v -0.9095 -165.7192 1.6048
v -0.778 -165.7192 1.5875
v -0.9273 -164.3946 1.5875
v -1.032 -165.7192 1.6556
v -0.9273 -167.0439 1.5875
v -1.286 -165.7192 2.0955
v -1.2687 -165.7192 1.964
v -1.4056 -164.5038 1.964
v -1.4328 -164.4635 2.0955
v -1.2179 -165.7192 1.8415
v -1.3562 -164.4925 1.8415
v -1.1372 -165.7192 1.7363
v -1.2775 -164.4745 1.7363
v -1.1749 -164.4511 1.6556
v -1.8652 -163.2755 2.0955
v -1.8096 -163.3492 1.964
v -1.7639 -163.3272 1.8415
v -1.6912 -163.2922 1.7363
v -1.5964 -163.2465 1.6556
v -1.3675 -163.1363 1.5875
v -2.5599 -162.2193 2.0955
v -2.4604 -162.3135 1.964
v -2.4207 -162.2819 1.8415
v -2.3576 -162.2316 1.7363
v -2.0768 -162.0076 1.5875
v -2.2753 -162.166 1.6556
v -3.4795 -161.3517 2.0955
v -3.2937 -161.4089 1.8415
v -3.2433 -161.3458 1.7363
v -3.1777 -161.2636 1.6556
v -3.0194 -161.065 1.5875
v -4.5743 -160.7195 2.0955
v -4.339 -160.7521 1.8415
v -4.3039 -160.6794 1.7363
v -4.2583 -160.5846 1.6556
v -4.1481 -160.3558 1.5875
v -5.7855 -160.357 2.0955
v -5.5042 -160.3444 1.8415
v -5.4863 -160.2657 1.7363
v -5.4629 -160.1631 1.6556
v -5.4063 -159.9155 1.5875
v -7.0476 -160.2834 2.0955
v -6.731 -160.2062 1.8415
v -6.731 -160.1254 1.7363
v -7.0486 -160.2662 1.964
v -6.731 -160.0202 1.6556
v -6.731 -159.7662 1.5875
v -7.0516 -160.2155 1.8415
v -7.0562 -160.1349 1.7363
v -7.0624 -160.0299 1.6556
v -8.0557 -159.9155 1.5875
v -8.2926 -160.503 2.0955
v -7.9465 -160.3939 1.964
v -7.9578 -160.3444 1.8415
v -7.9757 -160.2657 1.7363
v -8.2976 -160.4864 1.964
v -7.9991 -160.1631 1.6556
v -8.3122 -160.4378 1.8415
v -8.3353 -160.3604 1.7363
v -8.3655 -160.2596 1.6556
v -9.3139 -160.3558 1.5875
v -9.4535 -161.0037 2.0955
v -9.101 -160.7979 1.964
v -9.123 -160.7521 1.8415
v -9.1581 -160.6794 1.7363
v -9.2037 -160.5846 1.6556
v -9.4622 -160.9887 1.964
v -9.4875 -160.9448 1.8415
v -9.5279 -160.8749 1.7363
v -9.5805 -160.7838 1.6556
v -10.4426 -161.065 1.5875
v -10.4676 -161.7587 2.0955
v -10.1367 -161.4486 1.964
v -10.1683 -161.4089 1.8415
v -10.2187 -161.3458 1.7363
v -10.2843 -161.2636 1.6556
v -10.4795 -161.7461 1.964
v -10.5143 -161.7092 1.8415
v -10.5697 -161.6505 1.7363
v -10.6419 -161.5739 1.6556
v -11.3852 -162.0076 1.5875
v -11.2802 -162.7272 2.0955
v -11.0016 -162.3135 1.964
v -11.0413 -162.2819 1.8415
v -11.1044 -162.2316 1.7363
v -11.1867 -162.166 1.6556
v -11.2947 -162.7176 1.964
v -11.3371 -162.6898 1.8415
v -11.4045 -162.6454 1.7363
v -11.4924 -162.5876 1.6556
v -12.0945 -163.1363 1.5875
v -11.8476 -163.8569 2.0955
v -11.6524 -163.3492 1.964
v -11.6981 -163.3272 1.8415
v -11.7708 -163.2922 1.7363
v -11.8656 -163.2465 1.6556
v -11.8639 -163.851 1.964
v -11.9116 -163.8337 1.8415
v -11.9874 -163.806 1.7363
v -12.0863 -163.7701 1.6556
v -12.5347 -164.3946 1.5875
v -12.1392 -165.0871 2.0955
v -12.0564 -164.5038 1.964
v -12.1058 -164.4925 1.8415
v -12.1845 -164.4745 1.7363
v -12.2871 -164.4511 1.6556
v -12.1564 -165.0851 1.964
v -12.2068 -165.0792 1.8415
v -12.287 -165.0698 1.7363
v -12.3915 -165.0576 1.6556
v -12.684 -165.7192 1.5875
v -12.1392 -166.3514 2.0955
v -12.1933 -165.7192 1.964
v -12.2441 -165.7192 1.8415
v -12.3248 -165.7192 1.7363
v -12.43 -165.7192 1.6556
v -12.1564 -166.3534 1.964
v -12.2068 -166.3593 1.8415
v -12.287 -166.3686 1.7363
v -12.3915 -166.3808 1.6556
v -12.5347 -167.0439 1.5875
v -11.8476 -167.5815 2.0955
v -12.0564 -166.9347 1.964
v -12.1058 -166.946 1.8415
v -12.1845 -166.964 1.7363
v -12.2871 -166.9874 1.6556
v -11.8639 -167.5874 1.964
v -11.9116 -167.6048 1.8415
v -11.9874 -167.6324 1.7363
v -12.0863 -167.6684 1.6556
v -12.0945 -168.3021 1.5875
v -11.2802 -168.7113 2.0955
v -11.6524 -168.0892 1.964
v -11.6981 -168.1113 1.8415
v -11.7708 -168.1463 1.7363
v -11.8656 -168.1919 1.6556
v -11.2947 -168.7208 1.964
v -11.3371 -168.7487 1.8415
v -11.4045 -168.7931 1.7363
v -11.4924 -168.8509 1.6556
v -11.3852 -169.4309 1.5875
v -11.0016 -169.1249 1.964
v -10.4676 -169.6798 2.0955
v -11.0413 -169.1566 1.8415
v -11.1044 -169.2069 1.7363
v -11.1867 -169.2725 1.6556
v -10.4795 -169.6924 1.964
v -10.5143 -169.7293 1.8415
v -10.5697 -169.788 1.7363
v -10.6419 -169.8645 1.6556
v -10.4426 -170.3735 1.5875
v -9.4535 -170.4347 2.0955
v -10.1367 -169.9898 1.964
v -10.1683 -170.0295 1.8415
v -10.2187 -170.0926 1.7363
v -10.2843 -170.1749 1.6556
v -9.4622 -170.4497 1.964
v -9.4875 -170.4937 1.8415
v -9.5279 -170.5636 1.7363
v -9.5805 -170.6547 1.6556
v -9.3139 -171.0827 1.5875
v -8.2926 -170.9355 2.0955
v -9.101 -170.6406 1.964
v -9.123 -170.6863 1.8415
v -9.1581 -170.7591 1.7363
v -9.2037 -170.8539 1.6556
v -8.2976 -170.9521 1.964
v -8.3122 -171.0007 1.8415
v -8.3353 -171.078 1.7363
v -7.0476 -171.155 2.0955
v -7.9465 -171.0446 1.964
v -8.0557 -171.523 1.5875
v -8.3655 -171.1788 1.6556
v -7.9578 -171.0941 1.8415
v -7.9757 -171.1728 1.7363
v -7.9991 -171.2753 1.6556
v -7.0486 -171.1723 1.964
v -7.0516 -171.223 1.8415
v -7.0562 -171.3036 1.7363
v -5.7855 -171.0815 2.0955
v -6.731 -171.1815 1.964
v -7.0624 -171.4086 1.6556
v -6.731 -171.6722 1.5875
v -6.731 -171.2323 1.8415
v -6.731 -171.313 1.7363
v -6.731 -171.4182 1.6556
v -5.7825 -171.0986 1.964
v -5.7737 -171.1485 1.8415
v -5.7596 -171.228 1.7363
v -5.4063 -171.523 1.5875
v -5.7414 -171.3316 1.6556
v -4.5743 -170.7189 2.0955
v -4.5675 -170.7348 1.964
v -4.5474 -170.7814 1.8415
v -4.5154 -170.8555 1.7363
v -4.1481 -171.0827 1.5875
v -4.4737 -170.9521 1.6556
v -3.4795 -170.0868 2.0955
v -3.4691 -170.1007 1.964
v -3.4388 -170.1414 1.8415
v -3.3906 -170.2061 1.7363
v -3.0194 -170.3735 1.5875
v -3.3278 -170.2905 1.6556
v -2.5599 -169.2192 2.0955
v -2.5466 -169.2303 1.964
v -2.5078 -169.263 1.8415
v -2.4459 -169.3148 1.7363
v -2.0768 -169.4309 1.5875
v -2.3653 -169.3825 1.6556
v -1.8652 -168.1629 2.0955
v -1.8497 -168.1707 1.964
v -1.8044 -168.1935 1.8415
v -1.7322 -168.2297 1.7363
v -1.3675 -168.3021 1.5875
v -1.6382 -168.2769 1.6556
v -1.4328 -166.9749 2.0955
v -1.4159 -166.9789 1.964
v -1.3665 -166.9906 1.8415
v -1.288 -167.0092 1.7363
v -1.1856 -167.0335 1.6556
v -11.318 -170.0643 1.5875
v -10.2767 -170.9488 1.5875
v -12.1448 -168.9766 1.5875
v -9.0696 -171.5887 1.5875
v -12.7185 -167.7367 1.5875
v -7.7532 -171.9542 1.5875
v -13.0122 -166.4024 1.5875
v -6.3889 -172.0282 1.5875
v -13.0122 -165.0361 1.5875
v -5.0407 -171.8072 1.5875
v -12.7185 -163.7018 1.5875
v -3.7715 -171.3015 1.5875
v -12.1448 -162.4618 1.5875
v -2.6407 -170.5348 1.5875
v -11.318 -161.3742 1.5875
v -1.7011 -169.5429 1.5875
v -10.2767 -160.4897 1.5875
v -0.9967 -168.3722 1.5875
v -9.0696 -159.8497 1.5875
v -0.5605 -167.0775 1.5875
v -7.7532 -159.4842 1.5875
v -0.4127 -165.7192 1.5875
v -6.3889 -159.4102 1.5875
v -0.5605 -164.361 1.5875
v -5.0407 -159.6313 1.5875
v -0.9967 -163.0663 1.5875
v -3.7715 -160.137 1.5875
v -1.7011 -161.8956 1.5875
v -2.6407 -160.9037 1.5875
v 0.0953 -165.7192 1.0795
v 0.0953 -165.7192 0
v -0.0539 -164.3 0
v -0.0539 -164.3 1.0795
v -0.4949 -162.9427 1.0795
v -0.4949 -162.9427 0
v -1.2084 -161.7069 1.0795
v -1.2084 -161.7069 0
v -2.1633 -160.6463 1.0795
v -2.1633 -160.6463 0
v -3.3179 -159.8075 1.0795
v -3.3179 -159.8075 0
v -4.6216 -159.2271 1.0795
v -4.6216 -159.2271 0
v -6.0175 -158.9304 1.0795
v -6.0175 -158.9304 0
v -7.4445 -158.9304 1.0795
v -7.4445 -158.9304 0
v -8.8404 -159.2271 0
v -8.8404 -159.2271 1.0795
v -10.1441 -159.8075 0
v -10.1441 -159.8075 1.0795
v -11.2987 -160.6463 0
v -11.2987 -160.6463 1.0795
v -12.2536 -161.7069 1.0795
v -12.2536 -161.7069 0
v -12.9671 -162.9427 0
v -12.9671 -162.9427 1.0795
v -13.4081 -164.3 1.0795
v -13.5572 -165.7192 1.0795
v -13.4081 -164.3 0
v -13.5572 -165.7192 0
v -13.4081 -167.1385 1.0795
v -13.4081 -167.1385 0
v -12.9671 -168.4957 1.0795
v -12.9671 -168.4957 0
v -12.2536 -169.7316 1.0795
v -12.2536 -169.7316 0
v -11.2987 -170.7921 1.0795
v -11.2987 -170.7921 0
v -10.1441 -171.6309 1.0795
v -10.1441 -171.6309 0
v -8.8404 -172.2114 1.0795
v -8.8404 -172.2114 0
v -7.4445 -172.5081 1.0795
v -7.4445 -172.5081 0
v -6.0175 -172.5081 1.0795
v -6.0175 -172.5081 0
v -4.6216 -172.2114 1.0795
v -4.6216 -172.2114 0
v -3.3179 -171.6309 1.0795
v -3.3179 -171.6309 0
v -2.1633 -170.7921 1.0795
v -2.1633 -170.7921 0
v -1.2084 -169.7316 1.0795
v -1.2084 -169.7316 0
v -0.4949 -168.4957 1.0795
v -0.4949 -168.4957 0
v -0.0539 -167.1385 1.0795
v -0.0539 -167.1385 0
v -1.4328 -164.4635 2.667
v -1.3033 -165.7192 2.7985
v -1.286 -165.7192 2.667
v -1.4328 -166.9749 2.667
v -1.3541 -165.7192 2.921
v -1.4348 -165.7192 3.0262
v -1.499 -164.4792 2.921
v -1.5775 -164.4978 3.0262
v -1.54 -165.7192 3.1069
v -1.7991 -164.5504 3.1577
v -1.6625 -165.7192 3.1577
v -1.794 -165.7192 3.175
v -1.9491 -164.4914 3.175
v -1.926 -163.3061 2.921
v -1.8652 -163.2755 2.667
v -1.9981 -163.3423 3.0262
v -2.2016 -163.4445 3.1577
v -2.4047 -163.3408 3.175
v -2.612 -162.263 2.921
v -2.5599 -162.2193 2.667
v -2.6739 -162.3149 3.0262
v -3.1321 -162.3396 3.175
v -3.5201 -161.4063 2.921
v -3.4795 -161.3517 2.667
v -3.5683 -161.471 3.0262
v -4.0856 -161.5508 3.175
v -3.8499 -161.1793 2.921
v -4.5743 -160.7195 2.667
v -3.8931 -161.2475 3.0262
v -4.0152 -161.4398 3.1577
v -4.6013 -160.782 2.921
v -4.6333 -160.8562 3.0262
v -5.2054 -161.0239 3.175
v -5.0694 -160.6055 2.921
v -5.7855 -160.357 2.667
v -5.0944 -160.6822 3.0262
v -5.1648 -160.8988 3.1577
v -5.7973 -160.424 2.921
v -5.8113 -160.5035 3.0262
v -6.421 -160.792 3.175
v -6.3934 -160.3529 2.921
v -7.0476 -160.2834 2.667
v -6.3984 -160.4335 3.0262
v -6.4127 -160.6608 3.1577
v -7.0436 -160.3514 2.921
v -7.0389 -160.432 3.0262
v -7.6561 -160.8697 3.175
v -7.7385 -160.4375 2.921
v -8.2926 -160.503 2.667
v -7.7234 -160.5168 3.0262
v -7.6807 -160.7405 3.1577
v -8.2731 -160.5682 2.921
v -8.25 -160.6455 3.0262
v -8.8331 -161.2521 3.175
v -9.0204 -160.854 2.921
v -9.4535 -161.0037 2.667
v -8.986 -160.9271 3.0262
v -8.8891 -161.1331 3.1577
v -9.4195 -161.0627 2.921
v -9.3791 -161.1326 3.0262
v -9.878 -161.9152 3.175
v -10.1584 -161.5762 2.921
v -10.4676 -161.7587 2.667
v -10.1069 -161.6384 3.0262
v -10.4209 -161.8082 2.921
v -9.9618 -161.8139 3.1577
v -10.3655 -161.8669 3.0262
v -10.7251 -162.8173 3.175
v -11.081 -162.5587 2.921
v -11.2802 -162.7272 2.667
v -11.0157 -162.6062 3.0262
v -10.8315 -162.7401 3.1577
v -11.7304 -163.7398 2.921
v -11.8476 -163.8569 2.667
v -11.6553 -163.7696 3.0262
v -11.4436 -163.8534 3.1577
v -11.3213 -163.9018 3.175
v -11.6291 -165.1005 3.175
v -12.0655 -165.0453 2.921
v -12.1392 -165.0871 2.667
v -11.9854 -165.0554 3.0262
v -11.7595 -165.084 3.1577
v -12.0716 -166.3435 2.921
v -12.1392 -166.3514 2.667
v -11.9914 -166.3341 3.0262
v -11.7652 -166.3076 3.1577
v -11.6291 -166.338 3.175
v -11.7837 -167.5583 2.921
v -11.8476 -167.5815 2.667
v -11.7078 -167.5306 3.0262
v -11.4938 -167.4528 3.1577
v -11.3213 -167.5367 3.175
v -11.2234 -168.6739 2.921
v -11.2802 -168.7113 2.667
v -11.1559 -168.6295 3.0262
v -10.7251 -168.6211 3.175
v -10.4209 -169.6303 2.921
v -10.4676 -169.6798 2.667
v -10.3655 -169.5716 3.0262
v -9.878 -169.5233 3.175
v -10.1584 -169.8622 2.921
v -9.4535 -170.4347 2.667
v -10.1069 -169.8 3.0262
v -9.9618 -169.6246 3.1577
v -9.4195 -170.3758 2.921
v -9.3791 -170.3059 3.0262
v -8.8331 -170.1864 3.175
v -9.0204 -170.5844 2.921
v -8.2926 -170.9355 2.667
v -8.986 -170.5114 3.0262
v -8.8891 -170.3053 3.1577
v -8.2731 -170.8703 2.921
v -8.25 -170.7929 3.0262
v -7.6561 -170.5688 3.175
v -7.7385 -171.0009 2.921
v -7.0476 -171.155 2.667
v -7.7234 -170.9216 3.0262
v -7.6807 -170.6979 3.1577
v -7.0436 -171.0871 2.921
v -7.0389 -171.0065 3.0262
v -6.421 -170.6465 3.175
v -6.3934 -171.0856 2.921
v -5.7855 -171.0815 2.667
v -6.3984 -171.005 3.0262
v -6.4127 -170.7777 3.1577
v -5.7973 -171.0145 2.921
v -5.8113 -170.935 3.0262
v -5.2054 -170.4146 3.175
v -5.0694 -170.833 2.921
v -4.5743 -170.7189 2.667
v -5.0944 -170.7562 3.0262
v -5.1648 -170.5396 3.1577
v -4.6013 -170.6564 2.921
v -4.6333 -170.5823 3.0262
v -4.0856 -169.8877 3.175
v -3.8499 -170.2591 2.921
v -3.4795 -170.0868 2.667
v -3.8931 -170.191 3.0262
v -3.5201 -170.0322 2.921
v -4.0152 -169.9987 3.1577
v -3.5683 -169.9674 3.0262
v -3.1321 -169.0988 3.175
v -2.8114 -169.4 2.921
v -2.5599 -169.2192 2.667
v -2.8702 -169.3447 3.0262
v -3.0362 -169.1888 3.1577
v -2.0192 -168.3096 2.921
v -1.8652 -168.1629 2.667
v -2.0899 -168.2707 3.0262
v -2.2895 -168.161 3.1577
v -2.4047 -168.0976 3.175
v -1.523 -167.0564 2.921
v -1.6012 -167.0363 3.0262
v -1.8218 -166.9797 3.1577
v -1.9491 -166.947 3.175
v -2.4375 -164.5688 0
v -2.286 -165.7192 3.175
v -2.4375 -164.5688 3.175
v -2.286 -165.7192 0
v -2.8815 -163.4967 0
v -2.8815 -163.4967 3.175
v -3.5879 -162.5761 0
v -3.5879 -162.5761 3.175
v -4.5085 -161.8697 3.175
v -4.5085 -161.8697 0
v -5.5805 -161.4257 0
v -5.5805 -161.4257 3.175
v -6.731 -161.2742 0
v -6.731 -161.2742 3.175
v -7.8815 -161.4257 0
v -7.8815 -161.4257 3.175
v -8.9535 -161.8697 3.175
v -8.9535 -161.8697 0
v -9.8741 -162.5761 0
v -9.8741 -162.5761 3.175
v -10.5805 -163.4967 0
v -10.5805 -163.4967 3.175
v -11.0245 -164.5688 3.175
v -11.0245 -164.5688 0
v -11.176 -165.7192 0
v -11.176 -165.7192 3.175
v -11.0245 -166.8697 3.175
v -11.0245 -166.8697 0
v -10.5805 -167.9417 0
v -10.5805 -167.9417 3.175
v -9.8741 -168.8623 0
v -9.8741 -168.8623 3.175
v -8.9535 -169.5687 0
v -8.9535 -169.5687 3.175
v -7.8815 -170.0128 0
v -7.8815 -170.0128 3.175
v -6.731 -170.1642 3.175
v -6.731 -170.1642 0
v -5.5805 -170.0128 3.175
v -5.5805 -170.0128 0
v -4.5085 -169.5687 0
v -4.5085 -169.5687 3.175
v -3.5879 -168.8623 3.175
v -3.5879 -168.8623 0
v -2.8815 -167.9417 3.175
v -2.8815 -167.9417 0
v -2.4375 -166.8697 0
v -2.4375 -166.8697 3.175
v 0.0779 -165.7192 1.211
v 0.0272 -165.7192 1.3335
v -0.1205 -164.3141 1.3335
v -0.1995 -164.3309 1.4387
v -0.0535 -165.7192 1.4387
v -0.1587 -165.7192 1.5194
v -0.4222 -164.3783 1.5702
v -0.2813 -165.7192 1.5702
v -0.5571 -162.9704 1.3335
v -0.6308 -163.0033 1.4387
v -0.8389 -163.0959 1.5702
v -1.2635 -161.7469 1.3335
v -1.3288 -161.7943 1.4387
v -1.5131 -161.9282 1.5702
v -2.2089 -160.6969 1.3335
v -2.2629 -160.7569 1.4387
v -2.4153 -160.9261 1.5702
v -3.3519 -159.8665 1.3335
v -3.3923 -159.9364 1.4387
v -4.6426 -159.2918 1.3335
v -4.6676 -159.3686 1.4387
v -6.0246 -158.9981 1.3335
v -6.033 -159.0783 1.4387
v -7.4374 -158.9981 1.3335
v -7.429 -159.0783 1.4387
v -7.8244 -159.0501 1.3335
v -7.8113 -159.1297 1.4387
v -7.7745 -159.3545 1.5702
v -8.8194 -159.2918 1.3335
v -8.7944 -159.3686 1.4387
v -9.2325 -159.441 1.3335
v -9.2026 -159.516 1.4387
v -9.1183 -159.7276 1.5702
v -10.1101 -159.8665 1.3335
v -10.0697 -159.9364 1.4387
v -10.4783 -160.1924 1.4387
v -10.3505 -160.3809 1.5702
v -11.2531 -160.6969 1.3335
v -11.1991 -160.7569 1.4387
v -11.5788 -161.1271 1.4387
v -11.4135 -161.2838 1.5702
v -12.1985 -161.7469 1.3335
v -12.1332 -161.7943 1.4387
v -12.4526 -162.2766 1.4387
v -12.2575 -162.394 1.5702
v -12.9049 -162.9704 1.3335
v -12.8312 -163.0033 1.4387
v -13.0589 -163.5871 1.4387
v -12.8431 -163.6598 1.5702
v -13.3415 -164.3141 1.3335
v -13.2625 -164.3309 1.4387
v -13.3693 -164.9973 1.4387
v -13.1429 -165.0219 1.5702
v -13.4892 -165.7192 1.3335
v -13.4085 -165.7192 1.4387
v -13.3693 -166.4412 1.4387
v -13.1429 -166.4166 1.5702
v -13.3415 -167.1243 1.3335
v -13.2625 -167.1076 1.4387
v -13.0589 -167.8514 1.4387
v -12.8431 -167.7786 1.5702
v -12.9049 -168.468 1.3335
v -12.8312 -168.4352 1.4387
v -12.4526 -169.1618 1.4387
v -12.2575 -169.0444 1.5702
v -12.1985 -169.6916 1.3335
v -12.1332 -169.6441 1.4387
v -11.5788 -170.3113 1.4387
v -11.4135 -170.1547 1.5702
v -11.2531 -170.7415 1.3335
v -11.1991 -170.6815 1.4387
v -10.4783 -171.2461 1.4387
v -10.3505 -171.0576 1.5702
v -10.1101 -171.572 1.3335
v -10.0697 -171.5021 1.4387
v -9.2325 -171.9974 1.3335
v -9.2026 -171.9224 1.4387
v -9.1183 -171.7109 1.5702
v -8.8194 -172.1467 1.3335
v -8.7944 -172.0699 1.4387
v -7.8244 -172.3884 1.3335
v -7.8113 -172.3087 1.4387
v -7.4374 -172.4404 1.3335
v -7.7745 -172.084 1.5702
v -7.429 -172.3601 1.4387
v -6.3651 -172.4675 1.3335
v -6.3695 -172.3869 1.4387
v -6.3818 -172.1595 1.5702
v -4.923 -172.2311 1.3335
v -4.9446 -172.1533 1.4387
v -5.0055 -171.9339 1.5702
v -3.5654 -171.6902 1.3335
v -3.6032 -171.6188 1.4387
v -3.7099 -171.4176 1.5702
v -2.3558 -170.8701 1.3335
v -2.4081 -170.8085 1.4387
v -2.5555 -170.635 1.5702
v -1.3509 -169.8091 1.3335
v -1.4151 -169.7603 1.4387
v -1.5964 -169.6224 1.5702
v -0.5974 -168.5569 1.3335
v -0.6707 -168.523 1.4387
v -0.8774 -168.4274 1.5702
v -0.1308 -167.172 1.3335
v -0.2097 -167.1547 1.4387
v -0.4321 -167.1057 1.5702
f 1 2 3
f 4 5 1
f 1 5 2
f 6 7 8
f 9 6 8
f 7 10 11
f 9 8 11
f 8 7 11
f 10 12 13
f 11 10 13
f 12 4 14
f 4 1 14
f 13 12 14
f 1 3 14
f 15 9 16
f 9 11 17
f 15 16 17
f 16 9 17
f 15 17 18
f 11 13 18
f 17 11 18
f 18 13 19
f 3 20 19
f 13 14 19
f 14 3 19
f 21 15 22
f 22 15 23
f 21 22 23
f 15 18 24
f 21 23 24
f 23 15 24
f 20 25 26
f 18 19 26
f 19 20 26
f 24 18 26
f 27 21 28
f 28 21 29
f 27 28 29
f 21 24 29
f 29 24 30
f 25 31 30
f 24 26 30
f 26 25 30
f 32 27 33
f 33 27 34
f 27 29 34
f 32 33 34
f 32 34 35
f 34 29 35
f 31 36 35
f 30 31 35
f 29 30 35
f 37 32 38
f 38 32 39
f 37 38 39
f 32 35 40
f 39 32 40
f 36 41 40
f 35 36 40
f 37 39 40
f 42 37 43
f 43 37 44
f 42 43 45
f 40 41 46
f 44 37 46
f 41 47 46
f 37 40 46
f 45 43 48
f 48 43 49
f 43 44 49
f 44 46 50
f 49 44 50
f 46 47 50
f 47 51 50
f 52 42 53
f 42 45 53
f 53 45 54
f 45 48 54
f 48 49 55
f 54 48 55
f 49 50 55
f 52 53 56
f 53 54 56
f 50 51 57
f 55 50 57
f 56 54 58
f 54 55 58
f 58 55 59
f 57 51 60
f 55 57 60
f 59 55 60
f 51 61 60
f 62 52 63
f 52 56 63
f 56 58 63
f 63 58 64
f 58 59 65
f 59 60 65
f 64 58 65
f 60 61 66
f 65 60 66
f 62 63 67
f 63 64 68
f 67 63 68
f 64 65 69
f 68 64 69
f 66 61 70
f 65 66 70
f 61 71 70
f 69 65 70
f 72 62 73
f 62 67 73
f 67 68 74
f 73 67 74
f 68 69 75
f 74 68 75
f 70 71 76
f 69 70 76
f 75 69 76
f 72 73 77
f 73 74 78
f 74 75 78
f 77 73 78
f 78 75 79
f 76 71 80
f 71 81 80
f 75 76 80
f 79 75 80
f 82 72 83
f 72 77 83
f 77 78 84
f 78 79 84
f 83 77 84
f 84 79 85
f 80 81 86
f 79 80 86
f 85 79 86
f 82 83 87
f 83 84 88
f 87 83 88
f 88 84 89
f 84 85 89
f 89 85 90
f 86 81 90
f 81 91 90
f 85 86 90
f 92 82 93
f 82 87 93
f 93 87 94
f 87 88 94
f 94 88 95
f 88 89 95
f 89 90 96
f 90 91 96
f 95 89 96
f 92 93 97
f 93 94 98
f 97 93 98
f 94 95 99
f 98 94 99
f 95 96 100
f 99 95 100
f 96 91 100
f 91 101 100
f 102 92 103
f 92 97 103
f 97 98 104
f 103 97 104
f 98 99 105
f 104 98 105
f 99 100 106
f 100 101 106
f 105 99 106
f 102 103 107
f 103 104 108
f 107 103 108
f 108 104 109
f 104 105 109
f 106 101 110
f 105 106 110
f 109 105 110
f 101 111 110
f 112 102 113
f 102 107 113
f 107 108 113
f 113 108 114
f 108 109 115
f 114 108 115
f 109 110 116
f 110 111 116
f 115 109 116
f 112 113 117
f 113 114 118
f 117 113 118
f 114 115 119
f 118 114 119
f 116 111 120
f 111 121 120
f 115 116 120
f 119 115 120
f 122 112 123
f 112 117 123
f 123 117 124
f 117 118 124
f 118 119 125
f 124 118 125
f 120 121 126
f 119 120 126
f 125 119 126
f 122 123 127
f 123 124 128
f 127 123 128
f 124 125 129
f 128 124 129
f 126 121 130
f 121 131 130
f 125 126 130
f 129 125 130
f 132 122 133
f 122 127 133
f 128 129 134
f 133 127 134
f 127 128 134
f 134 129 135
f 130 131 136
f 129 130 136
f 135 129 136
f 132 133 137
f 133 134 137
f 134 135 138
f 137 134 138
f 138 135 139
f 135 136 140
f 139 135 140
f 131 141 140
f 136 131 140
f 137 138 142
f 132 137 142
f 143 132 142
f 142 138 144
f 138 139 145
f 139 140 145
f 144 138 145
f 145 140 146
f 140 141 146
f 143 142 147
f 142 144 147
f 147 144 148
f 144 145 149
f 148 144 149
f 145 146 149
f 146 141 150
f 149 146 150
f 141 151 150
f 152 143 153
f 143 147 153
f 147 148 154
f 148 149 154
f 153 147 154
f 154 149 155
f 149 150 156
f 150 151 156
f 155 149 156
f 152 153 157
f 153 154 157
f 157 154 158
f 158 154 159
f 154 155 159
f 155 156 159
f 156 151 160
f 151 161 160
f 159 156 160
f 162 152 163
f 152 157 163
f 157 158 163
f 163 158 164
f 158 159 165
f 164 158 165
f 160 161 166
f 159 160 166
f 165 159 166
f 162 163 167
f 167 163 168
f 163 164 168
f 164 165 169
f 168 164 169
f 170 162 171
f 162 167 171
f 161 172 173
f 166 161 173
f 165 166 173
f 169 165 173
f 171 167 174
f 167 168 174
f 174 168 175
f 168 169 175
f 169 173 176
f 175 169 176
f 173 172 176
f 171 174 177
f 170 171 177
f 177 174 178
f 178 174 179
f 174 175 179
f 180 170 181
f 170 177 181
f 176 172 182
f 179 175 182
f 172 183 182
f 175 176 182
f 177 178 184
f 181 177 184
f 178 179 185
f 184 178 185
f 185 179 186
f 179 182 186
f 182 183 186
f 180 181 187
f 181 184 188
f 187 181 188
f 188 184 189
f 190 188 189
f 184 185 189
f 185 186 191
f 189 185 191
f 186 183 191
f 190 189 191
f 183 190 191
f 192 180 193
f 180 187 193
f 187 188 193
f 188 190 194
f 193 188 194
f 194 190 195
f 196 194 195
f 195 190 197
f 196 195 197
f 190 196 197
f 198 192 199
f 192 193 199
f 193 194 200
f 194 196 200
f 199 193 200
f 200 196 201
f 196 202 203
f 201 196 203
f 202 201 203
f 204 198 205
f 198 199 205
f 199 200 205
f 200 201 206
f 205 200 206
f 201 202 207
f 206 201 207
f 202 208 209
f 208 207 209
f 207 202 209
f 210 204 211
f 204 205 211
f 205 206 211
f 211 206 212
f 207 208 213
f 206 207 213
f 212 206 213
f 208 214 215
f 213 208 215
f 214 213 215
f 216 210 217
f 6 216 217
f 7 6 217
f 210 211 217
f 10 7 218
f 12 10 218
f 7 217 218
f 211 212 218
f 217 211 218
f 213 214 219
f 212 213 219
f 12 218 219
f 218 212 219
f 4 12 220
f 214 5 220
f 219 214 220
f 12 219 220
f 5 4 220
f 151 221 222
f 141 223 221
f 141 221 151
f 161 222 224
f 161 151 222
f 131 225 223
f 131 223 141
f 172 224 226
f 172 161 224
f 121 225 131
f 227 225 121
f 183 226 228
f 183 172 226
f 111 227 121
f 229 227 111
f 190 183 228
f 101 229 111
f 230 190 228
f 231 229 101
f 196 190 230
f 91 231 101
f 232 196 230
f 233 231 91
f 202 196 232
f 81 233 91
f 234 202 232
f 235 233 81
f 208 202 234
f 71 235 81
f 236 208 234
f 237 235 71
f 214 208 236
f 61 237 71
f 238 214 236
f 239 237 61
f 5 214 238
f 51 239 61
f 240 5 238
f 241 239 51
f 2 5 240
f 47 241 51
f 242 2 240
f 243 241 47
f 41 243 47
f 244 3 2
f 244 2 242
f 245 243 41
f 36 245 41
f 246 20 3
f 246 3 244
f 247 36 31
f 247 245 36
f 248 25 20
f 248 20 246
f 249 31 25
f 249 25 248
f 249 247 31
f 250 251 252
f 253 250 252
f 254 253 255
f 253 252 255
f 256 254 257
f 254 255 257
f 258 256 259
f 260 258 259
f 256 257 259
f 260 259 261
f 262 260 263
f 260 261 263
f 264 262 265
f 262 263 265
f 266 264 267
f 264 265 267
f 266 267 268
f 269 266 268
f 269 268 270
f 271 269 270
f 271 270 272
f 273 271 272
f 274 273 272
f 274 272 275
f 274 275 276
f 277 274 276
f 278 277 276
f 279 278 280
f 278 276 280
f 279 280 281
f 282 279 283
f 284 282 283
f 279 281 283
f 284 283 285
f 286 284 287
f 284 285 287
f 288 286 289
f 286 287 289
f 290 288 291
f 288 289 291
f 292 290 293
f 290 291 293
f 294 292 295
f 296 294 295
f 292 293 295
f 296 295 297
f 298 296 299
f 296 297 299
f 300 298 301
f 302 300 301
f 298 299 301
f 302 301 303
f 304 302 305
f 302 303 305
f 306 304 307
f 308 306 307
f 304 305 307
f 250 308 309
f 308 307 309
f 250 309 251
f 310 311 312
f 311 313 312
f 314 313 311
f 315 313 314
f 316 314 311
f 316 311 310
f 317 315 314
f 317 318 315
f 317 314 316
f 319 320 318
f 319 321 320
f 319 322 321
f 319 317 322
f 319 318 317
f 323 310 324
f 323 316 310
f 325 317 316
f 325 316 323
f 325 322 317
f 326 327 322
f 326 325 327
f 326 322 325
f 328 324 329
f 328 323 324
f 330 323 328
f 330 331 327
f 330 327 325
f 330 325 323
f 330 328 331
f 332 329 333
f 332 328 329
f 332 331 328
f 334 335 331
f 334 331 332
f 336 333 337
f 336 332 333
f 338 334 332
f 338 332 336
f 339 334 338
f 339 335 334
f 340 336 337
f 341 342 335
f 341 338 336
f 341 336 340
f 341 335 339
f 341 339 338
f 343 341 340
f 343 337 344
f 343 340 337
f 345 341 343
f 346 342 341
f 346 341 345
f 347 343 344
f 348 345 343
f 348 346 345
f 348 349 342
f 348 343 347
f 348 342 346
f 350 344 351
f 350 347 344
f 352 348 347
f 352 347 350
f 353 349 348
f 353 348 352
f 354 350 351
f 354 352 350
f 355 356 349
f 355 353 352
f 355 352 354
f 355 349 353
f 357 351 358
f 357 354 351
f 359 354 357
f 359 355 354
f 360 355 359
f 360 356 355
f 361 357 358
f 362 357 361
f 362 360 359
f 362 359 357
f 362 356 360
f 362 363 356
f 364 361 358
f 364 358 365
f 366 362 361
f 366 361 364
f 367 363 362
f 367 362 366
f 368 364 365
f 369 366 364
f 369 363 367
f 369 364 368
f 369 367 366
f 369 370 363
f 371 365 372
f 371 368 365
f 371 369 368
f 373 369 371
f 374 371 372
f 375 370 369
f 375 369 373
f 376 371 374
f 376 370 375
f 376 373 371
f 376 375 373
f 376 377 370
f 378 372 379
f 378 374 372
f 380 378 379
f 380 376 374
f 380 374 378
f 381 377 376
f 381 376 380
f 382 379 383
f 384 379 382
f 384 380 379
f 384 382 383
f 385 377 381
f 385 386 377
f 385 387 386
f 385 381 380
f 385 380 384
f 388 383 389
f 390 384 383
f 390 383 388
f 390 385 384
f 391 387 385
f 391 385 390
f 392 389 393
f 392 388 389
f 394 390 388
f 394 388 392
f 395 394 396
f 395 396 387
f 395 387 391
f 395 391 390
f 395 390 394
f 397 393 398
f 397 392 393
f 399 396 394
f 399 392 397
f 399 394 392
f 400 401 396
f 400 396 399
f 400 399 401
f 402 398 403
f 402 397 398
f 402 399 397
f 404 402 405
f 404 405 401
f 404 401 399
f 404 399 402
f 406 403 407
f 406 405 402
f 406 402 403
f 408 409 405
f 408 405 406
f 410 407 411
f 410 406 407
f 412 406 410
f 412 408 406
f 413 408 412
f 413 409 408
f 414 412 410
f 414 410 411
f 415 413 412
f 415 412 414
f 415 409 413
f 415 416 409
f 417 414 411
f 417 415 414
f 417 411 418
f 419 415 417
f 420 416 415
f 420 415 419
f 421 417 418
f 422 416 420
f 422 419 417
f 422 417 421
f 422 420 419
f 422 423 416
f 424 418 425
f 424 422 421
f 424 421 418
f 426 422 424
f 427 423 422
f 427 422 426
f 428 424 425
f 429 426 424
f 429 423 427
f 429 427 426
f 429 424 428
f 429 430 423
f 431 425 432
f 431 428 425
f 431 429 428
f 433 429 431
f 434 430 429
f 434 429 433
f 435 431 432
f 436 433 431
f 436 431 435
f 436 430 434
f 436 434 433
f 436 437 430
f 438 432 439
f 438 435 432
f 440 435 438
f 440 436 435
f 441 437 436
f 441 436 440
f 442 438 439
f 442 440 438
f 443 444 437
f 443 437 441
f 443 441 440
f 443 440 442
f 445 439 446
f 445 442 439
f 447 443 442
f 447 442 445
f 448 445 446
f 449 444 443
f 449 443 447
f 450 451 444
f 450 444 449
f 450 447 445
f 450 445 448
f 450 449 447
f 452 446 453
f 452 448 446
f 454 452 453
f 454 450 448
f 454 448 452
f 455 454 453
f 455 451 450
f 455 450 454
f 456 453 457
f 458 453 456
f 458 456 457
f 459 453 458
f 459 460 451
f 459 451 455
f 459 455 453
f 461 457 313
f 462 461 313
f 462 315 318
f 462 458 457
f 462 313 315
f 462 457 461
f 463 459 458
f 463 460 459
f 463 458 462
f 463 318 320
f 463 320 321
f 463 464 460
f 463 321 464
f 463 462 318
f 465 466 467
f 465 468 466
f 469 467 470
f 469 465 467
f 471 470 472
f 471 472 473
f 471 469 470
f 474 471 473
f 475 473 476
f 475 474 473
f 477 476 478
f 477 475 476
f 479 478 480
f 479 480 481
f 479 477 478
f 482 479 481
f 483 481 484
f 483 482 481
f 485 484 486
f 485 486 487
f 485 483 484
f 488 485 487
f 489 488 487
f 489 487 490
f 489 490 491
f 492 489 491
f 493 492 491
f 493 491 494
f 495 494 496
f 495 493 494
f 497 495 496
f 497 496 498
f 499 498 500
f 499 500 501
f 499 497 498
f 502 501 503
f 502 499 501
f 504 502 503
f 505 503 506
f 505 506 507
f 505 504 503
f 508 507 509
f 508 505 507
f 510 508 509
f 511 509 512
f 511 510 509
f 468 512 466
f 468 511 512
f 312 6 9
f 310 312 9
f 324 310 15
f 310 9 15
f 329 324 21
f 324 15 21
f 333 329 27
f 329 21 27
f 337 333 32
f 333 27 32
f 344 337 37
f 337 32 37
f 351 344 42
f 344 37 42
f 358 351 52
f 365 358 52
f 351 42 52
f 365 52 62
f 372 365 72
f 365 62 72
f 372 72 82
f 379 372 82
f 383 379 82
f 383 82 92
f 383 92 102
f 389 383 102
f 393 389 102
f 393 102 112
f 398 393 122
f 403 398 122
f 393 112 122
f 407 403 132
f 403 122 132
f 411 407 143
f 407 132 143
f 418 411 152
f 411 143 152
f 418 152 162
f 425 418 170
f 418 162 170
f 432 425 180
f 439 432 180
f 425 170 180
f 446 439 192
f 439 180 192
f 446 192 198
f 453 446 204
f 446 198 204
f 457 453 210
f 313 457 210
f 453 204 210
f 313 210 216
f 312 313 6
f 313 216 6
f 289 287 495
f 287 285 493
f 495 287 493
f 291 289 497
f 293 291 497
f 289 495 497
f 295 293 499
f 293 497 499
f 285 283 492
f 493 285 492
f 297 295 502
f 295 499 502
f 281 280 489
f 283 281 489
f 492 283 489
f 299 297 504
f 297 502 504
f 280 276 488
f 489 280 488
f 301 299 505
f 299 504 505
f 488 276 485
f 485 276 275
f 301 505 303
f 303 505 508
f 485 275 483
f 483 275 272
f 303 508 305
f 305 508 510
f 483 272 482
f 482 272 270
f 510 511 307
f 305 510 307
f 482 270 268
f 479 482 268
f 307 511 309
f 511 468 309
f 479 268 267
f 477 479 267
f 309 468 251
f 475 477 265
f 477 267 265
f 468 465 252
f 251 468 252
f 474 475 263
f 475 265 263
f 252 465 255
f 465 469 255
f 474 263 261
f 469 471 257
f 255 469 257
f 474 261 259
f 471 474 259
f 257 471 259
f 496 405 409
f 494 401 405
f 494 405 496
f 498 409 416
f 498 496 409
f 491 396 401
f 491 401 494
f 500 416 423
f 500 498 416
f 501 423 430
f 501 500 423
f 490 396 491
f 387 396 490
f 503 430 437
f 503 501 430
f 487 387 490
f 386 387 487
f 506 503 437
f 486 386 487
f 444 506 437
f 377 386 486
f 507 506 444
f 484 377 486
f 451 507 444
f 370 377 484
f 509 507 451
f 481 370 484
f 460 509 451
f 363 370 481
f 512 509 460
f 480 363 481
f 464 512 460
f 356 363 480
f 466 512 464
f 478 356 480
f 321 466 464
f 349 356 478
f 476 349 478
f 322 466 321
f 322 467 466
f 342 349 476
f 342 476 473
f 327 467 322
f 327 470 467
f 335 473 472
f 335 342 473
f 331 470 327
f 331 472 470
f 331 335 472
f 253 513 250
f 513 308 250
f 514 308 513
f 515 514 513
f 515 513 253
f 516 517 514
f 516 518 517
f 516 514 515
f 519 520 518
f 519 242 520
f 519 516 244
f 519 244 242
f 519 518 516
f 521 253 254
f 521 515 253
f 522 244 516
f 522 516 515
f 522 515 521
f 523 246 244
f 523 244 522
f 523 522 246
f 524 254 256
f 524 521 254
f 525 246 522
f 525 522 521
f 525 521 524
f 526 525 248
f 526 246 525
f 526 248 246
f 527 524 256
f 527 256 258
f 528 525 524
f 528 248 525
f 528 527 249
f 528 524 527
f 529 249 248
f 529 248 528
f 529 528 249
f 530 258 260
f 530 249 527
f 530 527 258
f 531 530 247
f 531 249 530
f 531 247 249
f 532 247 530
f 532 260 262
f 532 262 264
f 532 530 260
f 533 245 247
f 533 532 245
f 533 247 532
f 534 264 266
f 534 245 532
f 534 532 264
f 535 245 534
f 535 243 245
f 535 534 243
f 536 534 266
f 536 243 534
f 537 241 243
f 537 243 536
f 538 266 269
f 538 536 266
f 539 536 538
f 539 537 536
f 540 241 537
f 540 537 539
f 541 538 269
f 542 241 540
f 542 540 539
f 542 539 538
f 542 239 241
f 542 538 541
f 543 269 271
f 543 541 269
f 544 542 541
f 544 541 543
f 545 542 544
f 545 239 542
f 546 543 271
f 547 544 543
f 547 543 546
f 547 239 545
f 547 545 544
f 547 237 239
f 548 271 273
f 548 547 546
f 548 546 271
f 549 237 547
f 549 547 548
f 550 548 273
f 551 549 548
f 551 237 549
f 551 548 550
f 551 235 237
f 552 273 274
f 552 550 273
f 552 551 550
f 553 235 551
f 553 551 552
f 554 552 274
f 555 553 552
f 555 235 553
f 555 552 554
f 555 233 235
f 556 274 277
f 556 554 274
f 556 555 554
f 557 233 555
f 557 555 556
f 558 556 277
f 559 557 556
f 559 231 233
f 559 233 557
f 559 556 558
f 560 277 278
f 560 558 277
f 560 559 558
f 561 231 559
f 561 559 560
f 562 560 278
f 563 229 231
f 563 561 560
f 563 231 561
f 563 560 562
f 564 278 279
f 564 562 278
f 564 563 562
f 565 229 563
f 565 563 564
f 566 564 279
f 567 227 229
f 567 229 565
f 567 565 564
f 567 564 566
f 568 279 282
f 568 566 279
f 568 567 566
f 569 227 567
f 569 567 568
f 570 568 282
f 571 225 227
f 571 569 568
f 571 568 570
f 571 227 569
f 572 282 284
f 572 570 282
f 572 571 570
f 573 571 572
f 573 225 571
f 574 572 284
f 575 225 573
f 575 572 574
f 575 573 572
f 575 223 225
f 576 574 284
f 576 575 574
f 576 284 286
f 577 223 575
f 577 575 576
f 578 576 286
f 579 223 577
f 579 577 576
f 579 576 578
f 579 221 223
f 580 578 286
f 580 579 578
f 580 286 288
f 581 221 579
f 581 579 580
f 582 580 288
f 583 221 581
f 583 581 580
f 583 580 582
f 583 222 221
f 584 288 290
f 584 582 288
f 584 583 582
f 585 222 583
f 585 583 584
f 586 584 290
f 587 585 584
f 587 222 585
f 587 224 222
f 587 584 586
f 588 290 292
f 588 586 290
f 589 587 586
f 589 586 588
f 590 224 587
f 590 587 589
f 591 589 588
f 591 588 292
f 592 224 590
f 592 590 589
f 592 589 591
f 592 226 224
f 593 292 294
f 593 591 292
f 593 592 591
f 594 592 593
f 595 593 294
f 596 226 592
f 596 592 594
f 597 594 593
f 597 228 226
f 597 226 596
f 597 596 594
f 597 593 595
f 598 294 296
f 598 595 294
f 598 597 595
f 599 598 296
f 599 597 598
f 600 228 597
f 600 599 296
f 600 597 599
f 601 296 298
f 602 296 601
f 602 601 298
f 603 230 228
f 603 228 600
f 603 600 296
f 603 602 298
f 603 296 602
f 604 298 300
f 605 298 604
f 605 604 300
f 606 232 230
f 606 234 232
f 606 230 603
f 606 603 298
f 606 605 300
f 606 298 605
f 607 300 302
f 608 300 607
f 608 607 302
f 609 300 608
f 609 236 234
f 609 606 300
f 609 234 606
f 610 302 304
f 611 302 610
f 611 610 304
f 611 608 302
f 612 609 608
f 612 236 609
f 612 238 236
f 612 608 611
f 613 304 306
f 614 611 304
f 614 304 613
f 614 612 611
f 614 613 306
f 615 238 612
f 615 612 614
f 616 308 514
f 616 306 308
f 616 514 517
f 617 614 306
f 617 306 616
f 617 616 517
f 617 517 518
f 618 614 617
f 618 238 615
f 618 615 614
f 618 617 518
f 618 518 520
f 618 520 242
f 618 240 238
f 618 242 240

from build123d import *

# Parameters (mm, degrees)
SKETCH1_R           = 6.82625
SKETCH1_R_2         = 4.445
BOSS_EXTRUDE1_DEPTH = 1.5875
SKETCH2_R           = 5.445
SKETCH2_R_2         = 4.445
EXTRUDE_THIN1_DEPTH = 1.5875
FILLET1_R           = 0.508


with BuildPart() as part:
    # Sketch1 → Boss-Extrude1 (new body)
    with BuildSketch(Plane.XY):
        with Locations((-6.731, -165.7192297)):
            Circle(SKETCH1_R)
        with Locations((-6.731, -165.7192297)):
            Circle(SKETCH1_R_2, mode=Mode.SUBTRACT)
    extrude(amount=BOSS_EXTRUDE1_DEPTH)

    # Sketch2 → Extrude-Thin1 (add)
    with BuildSketch(Plane.XY.offset(1.5875)):
        with Locations((-6.731, -165.7192297)):
            Circle(SKETCH2_R)
        with Locations((-6.731, -165.7192297)):
            Circle(SKETCH2_R_2, mode=Mode.SUBTRACT)
    extrude(amount=EXTRUDE_THIN1_DEPTH)

    # Fillet1
    fillet1_edges = [part.edges().sort_by_distance(p)[0] for p in [
        (-12.176, -165.7192297, 3.175),
        (-12.176, -165.7192297, 1.5875),
        (-13.55725, -165.7192297, 1.5875),
    ]]
    fillet(fillet1_edges, radius=FILLET1_R)


solid = part.part
